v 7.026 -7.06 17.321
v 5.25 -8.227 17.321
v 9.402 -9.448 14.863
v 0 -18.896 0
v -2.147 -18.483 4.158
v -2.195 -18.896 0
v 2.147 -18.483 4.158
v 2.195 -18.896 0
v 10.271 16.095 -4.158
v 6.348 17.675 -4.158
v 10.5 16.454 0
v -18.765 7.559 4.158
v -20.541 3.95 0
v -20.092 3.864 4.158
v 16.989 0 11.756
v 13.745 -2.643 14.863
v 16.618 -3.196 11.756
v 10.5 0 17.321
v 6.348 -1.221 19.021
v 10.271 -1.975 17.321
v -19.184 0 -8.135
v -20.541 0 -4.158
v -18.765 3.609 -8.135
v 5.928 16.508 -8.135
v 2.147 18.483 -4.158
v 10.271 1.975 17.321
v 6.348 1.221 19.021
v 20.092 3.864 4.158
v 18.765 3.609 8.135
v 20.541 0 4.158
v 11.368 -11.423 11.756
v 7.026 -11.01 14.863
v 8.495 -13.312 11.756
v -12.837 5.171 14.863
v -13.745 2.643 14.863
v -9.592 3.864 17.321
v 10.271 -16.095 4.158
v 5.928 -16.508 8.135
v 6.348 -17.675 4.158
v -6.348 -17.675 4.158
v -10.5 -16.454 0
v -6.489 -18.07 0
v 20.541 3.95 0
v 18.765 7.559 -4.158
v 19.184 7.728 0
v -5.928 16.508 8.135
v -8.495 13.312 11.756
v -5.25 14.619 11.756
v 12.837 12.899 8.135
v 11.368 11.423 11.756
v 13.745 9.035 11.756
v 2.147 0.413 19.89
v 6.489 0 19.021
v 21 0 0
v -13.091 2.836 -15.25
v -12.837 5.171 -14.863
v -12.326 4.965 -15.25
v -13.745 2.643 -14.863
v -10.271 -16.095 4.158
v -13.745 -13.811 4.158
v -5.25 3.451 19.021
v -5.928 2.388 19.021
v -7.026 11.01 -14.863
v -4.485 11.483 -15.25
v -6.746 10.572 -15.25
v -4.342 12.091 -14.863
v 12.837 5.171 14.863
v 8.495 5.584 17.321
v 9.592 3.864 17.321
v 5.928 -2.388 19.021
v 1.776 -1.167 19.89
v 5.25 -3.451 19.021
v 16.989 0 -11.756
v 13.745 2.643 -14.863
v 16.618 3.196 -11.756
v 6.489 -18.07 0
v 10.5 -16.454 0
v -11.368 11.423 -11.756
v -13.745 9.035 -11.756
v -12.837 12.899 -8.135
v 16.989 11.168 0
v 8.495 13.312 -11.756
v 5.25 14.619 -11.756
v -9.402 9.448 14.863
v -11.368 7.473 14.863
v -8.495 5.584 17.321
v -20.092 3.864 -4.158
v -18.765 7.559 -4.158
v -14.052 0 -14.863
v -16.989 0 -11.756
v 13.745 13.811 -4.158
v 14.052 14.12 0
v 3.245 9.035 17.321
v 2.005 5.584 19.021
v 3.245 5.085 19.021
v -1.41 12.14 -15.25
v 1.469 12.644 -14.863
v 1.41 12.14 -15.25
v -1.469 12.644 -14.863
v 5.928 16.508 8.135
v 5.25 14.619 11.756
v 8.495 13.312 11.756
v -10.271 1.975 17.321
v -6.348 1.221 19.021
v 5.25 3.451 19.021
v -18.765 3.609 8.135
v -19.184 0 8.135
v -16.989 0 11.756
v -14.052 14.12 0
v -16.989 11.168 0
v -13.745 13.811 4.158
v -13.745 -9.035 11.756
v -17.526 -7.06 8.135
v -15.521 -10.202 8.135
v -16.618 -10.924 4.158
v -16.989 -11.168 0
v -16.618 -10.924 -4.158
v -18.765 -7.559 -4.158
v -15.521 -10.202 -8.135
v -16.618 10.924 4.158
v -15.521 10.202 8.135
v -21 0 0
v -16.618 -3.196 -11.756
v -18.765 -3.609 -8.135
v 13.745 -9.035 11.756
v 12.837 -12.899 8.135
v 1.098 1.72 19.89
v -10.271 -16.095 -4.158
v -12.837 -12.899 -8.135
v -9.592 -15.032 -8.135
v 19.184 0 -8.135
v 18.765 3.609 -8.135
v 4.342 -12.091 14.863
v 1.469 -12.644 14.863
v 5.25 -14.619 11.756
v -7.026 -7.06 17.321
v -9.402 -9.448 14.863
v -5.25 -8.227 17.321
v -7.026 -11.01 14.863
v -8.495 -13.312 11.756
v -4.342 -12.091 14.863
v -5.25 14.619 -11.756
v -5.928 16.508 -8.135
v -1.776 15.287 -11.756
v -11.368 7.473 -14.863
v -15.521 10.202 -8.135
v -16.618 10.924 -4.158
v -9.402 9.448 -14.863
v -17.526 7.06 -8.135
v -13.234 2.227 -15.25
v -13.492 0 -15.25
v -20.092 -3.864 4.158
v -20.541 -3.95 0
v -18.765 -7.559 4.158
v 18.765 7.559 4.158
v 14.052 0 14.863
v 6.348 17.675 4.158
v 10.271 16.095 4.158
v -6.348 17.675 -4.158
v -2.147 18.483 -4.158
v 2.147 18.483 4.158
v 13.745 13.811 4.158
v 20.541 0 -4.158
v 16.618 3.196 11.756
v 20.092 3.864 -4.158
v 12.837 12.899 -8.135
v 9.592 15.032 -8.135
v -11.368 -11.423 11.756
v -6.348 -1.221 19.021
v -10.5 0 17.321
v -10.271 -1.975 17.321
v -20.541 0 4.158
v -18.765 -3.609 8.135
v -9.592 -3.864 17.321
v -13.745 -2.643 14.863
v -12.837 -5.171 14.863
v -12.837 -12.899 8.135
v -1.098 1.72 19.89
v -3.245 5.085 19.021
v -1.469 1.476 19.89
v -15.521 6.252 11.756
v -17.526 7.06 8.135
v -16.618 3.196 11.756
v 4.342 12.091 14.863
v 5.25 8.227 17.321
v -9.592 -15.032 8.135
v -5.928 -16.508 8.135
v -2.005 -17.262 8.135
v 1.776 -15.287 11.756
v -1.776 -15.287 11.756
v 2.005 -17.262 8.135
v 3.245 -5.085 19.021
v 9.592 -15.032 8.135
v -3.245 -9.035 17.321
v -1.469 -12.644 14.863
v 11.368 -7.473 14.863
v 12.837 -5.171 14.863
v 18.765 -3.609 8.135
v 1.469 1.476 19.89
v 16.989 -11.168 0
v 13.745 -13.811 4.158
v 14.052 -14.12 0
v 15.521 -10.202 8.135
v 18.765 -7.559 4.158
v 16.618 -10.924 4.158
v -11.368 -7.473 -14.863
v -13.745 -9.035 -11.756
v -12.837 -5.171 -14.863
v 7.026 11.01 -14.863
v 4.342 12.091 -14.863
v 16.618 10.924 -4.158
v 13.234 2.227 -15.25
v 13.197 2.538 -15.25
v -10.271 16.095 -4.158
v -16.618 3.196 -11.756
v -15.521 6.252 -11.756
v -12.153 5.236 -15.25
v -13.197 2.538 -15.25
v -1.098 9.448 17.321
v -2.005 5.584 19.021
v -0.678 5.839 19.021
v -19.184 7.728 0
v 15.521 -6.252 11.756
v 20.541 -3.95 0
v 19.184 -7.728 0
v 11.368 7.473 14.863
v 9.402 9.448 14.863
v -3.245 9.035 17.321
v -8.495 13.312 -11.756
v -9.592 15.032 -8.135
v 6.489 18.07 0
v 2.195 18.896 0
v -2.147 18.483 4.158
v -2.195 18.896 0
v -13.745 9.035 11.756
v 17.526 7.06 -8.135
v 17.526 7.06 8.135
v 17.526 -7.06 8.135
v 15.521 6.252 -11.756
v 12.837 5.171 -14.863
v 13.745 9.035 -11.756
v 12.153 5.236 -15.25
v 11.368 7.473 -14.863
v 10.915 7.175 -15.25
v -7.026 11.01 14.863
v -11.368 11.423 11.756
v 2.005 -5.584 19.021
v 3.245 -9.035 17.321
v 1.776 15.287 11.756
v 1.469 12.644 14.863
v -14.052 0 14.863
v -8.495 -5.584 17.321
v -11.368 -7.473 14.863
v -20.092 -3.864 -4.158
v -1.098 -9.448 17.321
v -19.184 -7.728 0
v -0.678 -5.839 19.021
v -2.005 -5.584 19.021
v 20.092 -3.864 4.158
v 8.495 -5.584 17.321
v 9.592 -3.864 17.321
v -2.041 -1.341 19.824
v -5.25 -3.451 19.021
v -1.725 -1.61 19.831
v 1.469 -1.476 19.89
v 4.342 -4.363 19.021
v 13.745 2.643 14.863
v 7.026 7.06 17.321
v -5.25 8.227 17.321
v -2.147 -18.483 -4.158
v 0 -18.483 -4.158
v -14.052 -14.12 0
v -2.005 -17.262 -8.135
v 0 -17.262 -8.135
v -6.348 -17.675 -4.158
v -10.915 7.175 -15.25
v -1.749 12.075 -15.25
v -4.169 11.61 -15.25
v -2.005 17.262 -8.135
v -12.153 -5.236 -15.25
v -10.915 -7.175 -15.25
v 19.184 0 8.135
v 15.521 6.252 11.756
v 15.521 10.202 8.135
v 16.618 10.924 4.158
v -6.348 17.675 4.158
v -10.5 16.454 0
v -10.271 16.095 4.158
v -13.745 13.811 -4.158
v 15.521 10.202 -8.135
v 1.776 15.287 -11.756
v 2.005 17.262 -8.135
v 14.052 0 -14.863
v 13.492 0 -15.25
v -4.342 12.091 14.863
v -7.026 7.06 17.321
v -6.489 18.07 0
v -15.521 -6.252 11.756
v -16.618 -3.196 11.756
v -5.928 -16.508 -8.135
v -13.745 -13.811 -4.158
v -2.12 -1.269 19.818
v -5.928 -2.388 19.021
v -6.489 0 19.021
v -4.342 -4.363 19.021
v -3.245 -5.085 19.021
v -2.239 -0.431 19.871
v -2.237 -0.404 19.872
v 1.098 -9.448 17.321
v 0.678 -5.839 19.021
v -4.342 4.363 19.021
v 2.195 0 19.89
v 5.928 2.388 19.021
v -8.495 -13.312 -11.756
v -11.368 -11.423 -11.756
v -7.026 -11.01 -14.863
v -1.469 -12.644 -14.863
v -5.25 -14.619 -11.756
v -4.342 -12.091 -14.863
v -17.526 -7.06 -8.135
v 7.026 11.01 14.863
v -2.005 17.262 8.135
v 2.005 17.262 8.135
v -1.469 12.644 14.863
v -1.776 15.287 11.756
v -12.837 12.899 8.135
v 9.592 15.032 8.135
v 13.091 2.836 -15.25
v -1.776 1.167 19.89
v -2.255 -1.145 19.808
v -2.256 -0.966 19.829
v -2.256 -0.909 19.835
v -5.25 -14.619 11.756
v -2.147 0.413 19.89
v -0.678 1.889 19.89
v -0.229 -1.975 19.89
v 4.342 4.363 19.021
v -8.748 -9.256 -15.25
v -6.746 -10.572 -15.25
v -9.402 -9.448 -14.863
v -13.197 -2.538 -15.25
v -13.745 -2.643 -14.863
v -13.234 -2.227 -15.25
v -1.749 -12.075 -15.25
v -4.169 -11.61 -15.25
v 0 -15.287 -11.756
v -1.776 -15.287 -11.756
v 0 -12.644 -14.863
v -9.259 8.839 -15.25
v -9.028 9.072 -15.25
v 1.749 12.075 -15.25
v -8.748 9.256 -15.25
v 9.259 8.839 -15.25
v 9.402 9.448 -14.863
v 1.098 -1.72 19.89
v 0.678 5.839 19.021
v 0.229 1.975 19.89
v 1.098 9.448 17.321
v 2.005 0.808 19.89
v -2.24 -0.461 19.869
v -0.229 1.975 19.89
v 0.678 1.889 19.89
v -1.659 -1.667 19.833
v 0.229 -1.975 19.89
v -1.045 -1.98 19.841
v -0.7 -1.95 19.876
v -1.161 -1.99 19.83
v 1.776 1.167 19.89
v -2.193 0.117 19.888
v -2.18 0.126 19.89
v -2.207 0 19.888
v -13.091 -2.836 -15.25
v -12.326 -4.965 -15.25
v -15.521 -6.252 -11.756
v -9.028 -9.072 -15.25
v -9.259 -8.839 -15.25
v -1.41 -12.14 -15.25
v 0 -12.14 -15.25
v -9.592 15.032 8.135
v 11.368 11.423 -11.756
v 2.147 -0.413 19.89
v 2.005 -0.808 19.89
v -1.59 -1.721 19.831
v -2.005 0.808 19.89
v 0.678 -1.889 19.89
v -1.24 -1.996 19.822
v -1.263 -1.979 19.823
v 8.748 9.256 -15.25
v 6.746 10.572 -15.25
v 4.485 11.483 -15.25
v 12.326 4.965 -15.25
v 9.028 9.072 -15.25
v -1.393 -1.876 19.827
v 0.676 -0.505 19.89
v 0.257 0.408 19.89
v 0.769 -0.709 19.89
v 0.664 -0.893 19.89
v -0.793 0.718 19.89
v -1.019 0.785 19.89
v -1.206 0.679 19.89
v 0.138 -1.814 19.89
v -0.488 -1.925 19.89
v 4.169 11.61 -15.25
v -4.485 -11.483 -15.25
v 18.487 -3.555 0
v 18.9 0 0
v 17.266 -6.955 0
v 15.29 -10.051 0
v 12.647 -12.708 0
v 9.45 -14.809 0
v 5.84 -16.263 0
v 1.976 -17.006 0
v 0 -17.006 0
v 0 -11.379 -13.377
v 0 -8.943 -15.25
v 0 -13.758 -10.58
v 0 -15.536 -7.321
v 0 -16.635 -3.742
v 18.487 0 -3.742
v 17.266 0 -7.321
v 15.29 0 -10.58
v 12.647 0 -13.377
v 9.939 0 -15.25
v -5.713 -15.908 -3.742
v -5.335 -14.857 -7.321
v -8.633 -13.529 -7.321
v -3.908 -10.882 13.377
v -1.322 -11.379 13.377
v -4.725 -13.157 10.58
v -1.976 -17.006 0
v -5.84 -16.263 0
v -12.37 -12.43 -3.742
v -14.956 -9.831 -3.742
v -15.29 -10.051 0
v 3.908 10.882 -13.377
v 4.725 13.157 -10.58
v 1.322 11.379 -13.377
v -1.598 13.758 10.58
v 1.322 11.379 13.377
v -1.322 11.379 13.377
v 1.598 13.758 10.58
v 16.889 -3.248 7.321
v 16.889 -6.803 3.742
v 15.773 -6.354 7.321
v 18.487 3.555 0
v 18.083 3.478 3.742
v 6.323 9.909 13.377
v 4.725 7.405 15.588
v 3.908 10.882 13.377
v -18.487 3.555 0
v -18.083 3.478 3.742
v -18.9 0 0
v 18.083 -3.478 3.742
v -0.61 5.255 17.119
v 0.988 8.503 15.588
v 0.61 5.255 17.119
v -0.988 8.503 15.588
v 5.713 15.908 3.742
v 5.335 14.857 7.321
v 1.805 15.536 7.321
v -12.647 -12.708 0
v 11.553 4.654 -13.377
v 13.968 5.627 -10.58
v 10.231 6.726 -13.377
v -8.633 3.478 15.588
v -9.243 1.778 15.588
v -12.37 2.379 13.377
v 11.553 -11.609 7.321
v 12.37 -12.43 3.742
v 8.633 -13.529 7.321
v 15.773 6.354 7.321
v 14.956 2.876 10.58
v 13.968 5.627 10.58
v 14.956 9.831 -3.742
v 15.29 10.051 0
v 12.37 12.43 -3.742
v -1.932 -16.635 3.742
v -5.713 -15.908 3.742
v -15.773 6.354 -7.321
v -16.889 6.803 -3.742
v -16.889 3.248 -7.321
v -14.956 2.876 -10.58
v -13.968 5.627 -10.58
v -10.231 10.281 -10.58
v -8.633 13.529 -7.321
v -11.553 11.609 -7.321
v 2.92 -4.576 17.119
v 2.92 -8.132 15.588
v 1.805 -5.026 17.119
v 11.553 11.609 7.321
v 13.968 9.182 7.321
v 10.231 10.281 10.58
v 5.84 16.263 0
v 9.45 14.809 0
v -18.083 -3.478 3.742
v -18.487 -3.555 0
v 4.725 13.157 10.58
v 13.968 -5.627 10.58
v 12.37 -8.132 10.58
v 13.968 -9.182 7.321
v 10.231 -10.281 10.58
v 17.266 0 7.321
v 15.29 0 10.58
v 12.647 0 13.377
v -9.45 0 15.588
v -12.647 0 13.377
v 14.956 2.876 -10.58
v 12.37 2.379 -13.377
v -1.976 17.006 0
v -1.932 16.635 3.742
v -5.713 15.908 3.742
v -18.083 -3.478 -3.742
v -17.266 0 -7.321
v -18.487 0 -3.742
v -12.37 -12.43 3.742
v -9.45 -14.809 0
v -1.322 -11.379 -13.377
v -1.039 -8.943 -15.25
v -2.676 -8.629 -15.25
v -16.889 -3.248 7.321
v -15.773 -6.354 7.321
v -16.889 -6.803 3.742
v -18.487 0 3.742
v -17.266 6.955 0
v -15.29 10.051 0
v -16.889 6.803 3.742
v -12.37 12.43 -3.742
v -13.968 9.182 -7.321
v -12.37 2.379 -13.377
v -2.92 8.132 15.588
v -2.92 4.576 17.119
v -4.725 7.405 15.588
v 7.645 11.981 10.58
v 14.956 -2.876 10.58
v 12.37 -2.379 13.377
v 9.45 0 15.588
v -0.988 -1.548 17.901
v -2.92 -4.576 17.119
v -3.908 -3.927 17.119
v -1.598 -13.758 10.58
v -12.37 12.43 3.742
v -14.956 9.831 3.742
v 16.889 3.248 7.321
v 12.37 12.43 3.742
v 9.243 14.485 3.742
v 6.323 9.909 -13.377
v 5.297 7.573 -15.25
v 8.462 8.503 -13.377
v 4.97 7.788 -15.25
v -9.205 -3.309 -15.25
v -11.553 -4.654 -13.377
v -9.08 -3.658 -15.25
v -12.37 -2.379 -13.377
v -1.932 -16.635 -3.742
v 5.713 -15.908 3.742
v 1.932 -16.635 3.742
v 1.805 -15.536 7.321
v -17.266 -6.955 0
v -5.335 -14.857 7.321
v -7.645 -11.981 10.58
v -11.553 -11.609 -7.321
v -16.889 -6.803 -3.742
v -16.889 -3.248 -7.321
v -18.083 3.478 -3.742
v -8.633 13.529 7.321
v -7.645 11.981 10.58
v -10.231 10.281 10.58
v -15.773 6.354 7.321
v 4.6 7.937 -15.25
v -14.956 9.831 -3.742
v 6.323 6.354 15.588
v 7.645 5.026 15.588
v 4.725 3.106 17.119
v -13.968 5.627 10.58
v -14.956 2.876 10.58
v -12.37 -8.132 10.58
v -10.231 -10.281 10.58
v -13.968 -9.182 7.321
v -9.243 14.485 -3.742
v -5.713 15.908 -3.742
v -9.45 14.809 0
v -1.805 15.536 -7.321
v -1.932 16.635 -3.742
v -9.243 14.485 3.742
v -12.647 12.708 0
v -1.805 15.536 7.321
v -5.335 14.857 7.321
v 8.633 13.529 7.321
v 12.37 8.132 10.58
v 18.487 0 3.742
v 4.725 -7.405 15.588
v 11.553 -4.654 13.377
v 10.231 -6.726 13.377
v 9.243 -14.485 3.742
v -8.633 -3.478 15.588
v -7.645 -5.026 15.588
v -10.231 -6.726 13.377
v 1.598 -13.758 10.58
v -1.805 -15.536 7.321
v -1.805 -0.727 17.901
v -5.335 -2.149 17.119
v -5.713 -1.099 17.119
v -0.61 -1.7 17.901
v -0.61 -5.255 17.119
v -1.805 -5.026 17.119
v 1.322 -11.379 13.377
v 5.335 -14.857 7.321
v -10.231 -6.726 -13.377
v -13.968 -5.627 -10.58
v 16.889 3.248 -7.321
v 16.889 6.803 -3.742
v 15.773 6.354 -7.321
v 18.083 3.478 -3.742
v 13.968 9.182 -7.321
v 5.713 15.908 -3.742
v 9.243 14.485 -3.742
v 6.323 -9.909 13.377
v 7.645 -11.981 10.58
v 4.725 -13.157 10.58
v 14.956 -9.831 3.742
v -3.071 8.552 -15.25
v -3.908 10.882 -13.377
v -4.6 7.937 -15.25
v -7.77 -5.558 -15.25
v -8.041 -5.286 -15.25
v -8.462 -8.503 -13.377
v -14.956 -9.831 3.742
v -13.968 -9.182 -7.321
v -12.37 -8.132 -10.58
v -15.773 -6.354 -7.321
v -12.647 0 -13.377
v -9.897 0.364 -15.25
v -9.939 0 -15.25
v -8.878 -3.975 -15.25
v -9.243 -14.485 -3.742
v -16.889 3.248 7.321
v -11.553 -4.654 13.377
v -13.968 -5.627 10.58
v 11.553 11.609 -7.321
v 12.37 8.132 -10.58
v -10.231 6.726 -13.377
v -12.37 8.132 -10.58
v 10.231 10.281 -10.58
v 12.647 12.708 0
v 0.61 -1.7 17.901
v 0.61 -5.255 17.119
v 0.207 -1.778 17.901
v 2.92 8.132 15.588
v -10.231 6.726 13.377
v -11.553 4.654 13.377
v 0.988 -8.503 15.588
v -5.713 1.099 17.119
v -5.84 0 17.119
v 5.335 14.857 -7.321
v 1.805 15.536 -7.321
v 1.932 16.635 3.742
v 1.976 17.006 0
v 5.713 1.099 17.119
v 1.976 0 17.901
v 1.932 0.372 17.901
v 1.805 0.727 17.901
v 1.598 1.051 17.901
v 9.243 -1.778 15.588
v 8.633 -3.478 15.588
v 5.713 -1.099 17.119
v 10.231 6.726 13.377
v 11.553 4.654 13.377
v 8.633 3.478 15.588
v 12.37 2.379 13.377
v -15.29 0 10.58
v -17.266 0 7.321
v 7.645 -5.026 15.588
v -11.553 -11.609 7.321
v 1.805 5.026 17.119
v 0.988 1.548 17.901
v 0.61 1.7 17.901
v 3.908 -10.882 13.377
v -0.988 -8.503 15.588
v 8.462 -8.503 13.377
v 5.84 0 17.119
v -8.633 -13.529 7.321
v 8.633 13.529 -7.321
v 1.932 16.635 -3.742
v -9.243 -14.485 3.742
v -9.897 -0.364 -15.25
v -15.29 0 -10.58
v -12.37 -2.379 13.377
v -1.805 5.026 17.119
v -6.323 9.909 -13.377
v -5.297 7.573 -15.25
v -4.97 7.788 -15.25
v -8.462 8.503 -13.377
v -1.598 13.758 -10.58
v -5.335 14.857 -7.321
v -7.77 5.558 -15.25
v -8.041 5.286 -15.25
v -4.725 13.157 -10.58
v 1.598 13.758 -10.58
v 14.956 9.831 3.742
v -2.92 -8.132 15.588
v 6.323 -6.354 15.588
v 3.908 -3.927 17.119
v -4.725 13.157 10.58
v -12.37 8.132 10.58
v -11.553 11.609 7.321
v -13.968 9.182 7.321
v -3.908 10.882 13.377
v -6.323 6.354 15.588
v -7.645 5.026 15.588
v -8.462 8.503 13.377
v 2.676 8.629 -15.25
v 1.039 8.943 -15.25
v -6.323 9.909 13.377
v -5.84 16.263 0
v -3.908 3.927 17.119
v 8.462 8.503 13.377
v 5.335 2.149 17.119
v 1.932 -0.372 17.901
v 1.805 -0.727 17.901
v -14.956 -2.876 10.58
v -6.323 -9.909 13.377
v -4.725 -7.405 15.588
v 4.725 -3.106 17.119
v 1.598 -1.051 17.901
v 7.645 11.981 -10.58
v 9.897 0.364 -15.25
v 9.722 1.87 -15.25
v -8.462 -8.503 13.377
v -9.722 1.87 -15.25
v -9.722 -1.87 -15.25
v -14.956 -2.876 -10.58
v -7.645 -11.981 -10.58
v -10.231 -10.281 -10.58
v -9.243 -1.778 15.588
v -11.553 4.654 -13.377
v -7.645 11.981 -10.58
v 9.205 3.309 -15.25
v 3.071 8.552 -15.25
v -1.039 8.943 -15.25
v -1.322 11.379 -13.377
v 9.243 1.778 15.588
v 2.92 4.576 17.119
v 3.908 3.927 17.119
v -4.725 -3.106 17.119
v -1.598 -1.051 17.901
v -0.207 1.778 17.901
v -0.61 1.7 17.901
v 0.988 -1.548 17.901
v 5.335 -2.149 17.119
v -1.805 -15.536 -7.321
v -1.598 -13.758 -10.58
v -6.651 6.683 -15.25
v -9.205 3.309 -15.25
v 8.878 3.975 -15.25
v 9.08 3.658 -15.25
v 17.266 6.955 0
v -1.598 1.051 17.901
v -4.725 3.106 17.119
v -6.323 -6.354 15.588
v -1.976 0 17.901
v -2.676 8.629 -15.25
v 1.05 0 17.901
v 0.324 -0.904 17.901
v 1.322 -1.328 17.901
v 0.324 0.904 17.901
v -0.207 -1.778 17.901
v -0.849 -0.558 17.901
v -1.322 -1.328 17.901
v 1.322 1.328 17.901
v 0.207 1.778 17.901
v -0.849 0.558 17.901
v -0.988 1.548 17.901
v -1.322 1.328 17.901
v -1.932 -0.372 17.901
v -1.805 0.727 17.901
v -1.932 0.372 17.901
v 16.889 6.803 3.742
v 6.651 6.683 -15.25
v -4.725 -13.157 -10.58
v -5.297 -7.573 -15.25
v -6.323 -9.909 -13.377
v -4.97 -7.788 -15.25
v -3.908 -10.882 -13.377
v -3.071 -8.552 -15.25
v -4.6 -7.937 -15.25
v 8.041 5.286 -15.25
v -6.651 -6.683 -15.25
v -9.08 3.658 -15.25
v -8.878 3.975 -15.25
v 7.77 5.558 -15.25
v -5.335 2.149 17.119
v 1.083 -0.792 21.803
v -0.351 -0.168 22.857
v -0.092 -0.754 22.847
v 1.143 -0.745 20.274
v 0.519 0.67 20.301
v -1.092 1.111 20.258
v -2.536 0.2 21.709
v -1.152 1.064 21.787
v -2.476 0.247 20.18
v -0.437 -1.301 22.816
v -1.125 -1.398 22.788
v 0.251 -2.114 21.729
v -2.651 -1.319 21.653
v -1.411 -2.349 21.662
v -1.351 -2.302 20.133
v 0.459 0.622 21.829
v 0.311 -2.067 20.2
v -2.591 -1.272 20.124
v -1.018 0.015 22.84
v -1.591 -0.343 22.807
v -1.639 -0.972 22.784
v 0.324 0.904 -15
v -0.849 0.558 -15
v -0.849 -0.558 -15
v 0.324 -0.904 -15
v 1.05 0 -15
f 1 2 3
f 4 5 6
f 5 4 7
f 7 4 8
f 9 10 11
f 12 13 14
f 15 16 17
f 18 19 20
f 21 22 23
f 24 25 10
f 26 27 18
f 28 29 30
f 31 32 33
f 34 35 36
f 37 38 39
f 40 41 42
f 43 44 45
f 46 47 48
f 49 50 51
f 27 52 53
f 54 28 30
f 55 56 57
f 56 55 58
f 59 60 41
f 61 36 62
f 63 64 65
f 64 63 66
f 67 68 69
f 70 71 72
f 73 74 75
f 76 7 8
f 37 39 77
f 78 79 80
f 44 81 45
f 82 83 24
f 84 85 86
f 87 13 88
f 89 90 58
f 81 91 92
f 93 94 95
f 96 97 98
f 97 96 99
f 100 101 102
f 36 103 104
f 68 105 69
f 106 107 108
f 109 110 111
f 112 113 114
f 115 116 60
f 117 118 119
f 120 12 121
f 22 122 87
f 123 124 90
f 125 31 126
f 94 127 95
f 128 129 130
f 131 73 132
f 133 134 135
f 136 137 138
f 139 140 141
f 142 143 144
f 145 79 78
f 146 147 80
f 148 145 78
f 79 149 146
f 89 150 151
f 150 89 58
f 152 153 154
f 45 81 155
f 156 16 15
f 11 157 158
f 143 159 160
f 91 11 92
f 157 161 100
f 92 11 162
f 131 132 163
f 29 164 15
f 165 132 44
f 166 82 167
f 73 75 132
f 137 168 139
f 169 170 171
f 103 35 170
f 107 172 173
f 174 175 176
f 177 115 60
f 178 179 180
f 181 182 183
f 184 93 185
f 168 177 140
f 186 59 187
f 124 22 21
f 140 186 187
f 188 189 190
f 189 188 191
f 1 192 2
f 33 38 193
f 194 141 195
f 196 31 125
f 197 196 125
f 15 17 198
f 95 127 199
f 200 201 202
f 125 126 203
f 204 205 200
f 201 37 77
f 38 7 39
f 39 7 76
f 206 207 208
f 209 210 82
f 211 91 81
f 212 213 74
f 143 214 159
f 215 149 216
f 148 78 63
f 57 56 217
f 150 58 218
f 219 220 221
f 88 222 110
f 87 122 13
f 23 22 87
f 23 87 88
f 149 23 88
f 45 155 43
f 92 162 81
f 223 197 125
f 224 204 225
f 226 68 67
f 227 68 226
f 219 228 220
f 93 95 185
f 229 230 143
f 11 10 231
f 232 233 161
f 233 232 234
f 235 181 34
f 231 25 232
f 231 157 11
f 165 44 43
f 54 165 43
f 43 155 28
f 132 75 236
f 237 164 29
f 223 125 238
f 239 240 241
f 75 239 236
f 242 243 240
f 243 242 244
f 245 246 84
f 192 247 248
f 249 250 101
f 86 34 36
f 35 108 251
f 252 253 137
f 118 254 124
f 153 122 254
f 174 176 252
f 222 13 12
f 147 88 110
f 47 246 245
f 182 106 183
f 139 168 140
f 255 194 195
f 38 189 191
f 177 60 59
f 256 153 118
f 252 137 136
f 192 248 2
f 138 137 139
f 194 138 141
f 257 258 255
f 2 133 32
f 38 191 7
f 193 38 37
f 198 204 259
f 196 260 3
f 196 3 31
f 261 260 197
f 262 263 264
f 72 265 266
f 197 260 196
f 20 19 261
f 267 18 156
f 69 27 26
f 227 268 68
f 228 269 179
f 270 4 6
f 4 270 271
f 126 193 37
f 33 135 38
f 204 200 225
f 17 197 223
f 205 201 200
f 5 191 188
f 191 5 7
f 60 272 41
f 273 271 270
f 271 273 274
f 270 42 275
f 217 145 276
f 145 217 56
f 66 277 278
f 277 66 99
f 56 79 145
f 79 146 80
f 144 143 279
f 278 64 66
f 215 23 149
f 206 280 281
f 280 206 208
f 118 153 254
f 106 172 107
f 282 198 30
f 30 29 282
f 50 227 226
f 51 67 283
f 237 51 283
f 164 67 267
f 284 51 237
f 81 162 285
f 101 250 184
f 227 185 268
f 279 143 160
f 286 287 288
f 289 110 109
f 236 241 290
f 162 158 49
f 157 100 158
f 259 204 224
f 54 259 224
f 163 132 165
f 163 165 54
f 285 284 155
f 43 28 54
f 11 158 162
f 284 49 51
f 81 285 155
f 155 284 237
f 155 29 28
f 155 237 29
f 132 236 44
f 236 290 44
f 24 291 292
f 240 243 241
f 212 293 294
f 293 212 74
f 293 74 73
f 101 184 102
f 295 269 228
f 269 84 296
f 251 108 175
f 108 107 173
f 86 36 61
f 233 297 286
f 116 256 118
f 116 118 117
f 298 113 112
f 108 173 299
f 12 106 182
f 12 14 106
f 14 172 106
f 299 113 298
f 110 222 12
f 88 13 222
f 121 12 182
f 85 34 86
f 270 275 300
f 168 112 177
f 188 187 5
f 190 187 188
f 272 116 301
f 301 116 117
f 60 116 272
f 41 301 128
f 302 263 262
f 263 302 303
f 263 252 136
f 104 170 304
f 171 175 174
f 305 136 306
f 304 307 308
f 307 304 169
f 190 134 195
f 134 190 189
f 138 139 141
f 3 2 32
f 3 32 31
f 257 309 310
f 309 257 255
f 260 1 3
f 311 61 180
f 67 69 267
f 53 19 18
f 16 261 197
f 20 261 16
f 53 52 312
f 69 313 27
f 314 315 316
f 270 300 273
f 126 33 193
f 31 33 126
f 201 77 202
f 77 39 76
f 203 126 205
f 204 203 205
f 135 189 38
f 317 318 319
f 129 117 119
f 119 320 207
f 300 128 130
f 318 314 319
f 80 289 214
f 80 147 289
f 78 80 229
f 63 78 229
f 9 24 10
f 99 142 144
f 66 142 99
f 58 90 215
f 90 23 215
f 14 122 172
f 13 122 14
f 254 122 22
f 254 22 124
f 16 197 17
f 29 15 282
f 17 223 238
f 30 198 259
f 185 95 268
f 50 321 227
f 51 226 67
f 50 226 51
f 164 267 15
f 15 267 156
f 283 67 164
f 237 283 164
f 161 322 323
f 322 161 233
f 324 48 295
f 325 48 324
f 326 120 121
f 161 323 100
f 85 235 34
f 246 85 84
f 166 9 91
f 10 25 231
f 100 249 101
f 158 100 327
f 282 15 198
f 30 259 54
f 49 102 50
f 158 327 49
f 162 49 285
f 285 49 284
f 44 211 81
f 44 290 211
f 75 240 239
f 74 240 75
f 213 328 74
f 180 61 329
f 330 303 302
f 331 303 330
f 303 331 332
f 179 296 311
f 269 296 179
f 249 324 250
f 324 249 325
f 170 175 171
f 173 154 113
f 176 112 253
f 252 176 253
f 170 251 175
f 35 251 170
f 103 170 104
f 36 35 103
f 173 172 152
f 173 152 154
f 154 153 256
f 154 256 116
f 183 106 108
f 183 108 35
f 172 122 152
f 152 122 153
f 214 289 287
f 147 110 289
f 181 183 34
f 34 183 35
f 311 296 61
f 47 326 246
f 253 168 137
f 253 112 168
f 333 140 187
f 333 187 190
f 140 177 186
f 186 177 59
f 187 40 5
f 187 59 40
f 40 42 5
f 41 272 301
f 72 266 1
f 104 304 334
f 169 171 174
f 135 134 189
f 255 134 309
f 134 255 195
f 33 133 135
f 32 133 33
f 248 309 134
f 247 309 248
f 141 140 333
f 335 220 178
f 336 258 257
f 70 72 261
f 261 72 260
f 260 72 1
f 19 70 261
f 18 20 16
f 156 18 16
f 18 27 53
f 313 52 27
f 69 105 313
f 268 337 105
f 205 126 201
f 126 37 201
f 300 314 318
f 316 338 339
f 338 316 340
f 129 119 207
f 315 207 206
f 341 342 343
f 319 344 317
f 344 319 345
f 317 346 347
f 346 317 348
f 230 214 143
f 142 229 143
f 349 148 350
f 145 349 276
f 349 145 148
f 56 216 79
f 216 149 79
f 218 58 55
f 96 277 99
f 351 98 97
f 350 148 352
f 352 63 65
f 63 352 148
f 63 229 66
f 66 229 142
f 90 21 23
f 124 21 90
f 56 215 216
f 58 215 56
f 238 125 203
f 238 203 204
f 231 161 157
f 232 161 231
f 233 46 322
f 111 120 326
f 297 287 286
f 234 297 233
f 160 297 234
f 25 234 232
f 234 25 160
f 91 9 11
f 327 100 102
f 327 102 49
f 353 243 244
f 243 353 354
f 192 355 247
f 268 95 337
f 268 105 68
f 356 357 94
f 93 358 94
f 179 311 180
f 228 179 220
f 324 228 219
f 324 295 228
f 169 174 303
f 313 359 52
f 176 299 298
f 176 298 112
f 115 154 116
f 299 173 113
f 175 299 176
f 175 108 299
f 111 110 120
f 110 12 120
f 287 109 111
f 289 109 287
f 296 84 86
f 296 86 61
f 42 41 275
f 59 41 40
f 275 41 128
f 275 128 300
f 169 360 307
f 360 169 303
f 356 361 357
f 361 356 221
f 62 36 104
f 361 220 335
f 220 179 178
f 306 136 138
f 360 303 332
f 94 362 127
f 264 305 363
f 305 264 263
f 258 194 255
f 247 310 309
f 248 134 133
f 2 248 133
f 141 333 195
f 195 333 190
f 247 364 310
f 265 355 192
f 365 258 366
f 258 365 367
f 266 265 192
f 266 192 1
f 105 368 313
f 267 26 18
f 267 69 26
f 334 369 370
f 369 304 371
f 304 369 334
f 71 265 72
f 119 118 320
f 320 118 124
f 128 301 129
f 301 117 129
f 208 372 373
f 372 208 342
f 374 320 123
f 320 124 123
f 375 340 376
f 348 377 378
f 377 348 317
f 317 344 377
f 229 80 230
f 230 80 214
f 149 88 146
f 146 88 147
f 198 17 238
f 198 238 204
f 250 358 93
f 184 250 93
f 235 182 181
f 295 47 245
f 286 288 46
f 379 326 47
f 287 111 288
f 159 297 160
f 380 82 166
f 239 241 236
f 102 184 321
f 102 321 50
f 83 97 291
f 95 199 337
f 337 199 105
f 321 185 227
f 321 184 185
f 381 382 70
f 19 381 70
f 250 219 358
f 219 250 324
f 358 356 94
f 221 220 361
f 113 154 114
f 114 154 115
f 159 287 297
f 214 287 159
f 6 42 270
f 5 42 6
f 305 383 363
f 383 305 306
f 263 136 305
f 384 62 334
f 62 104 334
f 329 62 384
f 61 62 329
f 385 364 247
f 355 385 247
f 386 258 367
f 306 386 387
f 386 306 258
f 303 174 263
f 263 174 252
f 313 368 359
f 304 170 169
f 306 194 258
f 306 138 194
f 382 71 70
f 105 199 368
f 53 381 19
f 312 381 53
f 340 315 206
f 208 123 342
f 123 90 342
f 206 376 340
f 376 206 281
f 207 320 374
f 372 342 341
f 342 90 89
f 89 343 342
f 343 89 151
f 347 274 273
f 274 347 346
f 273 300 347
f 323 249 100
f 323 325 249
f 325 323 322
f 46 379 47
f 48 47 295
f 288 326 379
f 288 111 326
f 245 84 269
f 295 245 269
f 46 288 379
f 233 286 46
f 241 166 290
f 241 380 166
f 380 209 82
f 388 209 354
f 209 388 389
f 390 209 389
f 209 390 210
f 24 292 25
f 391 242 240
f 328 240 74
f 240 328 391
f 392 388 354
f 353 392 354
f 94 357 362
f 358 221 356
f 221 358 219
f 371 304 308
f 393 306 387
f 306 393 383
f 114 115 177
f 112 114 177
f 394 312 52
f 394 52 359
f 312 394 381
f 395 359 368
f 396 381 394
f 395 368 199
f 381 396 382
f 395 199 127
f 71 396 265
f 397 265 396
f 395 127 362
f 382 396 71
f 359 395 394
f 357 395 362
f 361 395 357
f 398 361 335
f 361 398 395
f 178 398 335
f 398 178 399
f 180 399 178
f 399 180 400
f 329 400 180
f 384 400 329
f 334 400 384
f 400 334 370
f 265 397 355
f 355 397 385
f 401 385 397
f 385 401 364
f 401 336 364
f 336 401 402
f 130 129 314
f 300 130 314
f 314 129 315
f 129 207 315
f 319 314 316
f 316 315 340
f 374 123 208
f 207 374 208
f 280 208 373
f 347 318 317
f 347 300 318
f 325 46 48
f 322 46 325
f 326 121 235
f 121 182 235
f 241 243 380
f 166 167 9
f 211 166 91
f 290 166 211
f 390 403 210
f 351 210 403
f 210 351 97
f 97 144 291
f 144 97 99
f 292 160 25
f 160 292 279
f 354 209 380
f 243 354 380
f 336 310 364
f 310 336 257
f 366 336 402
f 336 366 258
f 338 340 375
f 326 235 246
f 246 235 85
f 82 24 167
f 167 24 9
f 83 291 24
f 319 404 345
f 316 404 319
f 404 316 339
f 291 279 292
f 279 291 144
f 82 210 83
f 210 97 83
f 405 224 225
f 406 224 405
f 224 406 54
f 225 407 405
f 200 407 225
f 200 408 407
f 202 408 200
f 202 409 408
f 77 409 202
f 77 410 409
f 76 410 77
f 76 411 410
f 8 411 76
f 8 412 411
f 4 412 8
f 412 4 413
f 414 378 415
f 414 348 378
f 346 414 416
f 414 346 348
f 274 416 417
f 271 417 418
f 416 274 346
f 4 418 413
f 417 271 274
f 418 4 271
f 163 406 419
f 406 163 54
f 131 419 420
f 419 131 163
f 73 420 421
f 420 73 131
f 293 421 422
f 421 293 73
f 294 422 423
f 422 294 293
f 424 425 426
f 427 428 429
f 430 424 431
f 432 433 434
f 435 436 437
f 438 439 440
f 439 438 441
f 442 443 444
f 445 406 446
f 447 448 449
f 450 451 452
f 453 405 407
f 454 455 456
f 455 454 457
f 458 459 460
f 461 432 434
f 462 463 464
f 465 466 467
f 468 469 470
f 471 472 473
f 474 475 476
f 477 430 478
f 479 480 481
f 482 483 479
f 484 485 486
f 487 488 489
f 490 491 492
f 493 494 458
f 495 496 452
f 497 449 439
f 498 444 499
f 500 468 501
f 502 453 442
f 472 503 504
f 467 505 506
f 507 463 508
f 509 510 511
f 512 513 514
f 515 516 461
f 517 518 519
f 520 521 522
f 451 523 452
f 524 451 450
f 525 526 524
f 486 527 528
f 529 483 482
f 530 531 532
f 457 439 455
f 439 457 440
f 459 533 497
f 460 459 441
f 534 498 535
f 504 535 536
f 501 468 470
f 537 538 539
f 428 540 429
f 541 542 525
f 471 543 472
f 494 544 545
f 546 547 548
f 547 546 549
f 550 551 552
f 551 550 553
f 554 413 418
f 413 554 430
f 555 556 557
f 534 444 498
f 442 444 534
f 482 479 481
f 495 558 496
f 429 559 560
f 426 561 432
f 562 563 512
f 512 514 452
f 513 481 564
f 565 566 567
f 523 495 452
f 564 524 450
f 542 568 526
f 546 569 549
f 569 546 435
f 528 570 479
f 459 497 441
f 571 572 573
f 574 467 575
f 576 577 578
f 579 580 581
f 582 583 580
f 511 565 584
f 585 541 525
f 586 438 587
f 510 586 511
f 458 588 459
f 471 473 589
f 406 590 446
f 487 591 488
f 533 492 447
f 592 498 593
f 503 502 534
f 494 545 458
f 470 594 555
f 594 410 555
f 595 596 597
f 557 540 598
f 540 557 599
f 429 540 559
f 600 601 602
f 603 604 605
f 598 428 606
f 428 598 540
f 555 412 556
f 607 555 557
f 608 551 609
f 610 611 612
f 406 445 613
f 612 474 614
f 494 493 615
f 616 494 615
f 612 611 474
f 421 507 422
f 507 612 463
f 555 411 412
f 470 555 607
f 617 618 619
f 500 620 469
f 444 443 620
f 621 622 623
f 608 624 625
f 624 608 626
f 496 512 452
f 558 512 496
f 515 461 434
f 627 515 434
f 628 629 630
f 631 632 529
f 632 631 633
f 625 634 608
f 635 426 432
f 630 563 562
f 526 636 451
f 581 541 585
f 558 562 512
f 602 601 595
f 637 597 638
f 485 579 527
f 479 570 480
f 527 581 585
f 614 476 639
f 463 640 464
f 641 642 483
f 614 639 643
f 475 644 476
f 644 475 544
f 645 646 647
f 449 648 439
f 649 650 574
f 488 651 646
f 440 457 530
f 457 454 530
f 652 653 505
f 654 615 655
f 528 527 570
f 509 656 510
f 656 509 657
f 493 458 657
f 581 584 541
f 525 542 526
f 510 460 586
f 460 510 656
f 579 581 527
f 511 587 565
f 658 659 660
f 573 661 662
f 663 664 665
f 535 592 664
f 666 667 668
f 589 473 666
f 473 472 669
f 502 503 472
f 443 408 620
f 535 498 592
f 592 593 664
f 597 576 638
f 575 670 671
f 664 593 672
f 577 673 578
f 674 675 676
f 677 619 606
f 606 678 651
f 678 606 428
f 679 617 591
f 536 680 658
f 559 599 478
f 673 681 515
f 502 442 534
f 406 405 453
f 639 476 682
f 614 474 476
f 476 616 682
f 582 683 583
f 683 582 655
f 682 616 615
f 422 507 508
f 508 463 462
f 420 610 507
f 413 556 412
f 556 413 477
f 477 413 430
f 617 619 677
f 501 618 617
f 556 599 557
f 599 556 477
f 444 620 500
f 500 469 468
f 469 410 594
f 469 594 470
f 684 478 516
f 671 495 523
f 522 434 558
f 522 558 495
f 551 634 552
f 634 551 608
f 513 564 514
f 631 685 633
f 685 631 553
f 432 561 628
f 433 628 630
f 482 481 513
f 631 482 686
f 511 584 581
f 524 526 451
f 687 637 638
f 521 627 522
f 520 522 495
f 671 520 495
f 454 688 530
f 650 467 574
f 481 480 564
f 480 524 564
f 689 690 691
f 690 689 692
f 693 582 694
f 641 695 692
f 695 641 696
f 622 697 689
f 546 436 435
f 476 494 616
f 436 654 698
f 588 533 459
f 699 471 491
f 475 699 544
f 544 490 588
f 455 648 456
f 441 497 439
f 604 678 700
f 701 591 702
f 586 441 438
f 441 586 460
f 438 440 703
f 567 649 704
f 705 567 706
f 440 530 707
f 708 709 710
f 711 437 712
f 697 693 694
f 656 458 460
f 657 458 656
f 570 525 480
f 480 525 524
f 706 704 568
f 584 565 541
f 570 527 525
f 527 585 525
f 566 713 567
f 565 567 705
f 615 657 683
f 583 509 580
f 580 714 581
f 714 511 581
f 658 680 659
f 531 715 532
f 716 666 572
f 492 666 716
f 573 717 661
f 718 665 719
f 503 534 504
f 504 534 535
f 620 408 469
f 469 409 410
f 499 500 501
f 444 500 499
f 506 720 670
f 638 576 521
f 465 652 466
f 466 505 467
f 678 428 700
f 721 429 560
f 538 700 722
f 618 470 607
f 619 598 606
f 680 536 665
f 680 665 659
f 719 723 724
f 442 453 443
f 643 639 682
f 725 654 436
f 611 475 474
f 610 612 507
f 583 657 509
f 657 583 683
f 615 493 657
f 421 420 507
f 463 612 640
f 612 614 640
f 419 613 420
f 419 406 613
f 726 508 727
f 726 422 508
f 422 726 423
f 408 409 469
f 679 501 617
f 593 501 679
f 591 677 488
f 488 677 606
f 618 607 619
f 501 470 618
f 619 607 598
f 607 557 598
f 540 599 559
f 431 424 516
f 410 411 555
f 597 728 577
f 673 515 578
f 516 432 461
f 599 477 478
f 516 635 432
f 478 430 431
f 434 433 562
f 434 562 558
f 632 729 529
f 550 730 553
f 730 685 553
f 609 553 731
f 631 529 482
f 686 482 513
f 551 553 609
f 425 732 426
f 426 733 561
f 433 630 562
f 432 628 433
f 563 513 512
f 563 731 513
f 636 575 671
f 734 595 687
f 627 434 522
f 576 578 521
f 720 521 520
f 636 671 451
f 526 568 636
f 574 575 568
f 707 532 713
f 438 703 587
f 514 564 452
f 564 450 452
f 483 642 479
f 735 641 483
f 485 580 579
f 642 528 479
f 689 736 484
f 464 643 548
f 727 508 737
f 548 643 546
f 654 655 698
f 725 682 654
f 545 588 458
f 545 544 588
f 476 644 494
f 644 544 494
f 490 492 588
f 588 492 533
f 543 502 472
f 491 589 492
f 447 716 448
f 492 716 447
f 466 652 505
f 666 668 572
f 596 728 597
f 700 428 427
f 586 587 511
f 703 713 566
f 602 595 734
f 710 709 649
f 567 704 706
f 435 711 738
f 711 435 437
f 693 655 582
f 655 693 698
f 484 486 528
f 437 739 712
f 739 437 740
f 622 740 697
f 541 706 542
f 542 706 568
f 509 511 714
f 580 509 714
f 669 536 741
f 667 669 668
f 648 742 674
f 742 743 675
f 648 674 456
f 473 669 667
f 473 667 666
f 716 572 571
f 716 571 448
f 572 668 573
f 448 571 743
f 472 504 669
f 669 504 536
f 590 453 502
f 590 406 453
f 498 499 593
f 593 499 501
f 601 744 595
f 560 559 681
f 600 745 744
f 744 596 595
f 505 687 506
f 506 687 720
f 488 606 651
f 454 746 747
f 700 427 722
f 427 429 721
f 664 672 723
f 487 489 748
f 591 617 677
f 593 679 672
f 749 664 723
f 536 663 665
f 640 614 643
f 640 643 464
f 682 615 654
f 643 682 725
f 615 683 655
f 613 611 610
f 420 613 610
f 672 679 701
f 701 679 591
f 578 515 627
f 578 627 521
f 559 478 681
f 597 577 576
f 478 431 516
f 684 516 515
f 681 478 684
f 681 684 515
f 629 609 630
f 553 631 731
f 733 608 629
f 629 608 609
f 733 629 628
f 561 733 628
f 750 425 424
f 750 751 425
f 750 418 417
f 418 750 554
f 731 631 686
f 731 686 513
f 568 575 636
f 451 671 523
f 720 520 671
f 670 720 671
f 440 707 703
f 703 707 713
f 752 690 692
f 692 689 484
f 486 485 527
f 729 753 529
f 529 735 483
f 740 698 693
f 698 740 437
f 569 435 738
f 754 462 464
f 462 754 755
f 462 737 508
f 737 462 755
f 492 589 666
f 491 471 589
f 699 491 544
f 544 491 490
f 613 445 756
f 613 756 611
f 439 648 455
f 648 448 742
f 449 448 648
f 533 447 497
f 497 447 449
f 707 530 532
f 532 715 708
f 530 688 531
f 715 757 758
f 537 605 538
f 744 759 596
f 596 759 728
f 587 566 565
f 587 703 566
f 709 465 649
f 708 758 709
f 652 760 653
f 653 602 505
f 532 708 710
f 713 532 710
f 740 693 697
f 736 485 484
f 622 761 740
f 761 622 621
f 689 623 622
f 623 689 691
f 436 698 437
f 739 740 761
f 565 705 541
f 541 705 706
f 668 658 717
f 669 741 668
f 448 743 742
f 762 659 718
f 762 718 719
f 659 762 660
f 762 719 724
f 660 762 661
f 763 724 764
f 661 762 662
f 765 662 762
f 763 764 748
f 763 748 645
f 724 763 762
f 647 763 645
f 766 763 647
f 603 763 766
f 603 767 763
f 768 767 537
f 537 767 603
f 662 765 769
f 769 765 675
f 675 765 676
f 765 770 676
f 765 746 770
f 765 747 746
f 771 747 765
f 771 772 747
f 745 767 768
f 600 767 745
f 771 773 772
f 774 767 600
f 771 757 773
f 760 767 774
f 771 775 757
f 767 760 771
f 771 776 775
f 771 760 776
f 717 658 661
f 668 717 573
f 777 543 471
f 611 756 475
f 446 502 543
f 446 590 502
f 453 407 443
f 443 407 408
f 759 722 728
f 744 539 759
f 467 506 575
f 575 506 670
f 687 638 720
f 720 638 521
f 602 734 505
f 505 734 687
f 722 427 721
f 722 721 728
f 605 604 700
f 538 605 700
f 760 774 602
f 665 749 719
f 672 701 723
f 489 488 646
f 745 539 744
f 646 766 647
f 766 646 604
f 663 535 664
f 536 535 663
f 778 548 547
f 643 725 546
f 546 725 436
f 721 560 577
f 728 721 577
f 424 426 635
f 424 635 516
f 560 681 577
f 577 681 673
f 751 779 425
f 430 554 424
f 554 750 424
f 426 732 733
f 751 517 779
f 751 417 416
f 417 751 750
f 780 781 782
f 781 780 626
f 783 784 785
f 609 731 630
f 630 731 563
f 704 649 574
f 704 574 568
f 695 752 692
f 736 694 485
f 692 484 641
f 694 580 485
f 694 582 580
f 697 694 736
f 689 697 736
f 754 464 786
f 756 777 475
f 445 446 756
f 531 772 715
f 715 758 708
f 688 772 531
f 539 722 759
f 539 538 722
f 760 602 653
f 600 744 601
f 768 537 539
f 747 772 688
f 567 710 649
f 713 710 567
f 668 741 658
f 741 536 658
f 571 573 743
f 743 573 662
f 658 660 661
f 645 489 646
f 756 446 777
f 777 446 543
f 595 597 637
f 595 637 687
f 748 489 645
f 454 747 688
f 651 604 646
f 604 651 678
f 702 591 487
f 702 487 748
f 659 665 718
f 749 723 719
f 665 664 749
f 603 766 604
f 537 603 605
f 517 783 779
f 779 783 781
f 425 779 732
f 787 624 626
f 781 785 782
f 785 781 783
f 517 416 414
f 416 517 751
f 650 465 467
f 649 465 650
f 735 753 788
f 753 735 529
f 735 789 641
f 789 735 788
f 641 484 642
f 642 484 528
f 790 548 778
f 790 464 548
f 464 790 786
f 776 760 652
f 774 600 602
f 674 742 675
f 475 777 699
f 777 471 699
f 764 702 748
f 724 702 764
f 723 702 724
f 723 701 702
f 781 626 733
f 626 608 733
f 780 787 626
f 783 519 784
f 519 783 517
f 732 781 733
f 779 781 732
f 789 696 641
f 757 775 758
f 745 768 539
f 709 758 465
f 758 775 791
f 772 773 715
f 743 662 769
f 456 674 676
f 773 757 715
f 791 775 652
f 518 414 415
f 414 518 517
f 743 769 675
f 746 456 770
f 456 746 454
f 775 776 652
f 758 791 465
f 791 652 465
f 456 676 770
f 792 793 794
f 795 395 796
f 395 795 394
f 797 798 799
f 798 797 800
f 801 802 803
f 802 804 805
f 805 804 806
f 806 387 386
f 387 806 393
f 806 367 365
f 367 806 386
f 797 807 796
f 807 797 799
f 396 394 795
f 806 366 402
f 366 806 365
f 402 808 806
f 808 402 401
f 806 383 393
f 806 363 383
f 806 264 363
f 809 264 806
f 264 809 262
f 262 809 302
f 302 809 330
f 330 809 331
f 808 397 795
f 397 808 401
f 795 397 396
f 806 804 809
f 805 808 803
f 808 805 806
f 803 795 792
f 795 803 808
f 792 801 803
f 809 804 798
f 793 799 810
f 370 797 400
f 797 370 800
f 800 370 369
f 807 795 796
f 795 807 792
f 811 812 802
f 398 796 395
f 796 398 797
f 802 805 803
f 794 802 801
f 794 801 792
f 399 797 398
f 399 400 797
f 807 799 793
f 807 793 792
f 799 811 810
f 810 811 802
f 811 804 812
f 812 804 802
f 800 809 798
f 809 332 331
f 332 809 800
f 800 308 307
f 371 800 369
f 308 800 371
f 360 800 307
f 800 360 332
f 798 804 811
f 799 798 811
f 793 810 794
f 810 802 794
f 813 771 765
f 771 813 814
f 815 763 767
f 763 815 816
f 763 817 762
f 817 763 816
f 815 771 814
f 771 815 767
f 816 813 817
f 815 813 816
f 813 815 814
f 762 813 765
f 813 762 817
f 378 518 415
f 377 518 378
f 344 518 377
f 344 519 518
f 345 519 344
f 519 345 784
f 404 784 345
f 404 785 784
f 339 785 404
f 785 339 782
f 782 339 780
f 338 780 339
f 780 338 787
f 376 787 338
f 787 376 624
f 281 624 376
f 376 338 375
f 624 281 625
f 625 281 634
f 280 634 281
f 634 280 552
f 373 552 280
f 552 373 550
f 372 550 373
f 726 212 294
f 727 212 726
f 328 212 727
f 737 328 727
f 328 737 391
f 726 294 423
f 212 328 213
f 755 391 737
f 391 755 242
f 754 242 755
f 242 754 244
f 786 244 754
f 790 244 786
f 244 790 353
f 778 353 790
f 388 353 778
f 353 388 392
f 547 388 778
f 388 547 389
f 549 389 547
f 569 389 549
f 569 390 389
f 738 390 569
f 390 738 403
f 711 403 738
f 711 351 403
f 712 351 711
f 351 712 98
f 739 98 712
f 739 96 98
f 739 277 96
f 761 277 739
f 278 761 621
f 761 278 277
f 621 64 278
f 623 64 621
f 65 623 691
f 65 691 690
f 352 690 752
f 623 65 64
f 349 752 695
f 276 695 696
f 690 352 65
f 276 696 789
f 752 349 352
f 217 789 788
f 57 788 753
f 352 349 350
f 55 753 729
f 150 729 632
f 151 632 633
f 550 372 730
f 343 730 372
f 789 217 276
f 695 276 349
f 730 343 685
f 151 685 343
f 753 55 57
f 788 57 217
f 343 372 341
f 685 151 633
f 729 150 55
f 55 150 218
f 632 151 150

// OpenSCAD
scale([1.05,.95,1]) applestore(); // scale([x,y,z])

module rine(width) {
    difference() {
        difference() {
            sphere(width);
            sphere(width-2);
        }
        translate([1,1,4]) sphere(width-1);
    }
}

module rine(width) {
    difference() {
        sphere(width);
        cube(width*2);
        sphere(width-2);
    }
}

module seed(height,width) {
    translate([0,0,-height]) circle(width);
}

module core(height,width) {
   translate([0,0,-height]) cylinder(width);
}

module stem() {
   rotate([2,2,4]) translate([0,0,-21]) sphere(2);
}

module ground() {
    translate([0,0,-15]) circle(25);
}

module applestore() {
    difference() {
        union() {
            rotate([180,0,0]) {
                color("darkgray") stem();
                color("green") rine(20);
                color("white") seed(-11,6); // seed(height,width)
                color("black") core(18,33); // core(height,width)
            }
            color("grey") ground();
        }
        translate([-13,-13,-41.25]) cube(26);
    }
}
